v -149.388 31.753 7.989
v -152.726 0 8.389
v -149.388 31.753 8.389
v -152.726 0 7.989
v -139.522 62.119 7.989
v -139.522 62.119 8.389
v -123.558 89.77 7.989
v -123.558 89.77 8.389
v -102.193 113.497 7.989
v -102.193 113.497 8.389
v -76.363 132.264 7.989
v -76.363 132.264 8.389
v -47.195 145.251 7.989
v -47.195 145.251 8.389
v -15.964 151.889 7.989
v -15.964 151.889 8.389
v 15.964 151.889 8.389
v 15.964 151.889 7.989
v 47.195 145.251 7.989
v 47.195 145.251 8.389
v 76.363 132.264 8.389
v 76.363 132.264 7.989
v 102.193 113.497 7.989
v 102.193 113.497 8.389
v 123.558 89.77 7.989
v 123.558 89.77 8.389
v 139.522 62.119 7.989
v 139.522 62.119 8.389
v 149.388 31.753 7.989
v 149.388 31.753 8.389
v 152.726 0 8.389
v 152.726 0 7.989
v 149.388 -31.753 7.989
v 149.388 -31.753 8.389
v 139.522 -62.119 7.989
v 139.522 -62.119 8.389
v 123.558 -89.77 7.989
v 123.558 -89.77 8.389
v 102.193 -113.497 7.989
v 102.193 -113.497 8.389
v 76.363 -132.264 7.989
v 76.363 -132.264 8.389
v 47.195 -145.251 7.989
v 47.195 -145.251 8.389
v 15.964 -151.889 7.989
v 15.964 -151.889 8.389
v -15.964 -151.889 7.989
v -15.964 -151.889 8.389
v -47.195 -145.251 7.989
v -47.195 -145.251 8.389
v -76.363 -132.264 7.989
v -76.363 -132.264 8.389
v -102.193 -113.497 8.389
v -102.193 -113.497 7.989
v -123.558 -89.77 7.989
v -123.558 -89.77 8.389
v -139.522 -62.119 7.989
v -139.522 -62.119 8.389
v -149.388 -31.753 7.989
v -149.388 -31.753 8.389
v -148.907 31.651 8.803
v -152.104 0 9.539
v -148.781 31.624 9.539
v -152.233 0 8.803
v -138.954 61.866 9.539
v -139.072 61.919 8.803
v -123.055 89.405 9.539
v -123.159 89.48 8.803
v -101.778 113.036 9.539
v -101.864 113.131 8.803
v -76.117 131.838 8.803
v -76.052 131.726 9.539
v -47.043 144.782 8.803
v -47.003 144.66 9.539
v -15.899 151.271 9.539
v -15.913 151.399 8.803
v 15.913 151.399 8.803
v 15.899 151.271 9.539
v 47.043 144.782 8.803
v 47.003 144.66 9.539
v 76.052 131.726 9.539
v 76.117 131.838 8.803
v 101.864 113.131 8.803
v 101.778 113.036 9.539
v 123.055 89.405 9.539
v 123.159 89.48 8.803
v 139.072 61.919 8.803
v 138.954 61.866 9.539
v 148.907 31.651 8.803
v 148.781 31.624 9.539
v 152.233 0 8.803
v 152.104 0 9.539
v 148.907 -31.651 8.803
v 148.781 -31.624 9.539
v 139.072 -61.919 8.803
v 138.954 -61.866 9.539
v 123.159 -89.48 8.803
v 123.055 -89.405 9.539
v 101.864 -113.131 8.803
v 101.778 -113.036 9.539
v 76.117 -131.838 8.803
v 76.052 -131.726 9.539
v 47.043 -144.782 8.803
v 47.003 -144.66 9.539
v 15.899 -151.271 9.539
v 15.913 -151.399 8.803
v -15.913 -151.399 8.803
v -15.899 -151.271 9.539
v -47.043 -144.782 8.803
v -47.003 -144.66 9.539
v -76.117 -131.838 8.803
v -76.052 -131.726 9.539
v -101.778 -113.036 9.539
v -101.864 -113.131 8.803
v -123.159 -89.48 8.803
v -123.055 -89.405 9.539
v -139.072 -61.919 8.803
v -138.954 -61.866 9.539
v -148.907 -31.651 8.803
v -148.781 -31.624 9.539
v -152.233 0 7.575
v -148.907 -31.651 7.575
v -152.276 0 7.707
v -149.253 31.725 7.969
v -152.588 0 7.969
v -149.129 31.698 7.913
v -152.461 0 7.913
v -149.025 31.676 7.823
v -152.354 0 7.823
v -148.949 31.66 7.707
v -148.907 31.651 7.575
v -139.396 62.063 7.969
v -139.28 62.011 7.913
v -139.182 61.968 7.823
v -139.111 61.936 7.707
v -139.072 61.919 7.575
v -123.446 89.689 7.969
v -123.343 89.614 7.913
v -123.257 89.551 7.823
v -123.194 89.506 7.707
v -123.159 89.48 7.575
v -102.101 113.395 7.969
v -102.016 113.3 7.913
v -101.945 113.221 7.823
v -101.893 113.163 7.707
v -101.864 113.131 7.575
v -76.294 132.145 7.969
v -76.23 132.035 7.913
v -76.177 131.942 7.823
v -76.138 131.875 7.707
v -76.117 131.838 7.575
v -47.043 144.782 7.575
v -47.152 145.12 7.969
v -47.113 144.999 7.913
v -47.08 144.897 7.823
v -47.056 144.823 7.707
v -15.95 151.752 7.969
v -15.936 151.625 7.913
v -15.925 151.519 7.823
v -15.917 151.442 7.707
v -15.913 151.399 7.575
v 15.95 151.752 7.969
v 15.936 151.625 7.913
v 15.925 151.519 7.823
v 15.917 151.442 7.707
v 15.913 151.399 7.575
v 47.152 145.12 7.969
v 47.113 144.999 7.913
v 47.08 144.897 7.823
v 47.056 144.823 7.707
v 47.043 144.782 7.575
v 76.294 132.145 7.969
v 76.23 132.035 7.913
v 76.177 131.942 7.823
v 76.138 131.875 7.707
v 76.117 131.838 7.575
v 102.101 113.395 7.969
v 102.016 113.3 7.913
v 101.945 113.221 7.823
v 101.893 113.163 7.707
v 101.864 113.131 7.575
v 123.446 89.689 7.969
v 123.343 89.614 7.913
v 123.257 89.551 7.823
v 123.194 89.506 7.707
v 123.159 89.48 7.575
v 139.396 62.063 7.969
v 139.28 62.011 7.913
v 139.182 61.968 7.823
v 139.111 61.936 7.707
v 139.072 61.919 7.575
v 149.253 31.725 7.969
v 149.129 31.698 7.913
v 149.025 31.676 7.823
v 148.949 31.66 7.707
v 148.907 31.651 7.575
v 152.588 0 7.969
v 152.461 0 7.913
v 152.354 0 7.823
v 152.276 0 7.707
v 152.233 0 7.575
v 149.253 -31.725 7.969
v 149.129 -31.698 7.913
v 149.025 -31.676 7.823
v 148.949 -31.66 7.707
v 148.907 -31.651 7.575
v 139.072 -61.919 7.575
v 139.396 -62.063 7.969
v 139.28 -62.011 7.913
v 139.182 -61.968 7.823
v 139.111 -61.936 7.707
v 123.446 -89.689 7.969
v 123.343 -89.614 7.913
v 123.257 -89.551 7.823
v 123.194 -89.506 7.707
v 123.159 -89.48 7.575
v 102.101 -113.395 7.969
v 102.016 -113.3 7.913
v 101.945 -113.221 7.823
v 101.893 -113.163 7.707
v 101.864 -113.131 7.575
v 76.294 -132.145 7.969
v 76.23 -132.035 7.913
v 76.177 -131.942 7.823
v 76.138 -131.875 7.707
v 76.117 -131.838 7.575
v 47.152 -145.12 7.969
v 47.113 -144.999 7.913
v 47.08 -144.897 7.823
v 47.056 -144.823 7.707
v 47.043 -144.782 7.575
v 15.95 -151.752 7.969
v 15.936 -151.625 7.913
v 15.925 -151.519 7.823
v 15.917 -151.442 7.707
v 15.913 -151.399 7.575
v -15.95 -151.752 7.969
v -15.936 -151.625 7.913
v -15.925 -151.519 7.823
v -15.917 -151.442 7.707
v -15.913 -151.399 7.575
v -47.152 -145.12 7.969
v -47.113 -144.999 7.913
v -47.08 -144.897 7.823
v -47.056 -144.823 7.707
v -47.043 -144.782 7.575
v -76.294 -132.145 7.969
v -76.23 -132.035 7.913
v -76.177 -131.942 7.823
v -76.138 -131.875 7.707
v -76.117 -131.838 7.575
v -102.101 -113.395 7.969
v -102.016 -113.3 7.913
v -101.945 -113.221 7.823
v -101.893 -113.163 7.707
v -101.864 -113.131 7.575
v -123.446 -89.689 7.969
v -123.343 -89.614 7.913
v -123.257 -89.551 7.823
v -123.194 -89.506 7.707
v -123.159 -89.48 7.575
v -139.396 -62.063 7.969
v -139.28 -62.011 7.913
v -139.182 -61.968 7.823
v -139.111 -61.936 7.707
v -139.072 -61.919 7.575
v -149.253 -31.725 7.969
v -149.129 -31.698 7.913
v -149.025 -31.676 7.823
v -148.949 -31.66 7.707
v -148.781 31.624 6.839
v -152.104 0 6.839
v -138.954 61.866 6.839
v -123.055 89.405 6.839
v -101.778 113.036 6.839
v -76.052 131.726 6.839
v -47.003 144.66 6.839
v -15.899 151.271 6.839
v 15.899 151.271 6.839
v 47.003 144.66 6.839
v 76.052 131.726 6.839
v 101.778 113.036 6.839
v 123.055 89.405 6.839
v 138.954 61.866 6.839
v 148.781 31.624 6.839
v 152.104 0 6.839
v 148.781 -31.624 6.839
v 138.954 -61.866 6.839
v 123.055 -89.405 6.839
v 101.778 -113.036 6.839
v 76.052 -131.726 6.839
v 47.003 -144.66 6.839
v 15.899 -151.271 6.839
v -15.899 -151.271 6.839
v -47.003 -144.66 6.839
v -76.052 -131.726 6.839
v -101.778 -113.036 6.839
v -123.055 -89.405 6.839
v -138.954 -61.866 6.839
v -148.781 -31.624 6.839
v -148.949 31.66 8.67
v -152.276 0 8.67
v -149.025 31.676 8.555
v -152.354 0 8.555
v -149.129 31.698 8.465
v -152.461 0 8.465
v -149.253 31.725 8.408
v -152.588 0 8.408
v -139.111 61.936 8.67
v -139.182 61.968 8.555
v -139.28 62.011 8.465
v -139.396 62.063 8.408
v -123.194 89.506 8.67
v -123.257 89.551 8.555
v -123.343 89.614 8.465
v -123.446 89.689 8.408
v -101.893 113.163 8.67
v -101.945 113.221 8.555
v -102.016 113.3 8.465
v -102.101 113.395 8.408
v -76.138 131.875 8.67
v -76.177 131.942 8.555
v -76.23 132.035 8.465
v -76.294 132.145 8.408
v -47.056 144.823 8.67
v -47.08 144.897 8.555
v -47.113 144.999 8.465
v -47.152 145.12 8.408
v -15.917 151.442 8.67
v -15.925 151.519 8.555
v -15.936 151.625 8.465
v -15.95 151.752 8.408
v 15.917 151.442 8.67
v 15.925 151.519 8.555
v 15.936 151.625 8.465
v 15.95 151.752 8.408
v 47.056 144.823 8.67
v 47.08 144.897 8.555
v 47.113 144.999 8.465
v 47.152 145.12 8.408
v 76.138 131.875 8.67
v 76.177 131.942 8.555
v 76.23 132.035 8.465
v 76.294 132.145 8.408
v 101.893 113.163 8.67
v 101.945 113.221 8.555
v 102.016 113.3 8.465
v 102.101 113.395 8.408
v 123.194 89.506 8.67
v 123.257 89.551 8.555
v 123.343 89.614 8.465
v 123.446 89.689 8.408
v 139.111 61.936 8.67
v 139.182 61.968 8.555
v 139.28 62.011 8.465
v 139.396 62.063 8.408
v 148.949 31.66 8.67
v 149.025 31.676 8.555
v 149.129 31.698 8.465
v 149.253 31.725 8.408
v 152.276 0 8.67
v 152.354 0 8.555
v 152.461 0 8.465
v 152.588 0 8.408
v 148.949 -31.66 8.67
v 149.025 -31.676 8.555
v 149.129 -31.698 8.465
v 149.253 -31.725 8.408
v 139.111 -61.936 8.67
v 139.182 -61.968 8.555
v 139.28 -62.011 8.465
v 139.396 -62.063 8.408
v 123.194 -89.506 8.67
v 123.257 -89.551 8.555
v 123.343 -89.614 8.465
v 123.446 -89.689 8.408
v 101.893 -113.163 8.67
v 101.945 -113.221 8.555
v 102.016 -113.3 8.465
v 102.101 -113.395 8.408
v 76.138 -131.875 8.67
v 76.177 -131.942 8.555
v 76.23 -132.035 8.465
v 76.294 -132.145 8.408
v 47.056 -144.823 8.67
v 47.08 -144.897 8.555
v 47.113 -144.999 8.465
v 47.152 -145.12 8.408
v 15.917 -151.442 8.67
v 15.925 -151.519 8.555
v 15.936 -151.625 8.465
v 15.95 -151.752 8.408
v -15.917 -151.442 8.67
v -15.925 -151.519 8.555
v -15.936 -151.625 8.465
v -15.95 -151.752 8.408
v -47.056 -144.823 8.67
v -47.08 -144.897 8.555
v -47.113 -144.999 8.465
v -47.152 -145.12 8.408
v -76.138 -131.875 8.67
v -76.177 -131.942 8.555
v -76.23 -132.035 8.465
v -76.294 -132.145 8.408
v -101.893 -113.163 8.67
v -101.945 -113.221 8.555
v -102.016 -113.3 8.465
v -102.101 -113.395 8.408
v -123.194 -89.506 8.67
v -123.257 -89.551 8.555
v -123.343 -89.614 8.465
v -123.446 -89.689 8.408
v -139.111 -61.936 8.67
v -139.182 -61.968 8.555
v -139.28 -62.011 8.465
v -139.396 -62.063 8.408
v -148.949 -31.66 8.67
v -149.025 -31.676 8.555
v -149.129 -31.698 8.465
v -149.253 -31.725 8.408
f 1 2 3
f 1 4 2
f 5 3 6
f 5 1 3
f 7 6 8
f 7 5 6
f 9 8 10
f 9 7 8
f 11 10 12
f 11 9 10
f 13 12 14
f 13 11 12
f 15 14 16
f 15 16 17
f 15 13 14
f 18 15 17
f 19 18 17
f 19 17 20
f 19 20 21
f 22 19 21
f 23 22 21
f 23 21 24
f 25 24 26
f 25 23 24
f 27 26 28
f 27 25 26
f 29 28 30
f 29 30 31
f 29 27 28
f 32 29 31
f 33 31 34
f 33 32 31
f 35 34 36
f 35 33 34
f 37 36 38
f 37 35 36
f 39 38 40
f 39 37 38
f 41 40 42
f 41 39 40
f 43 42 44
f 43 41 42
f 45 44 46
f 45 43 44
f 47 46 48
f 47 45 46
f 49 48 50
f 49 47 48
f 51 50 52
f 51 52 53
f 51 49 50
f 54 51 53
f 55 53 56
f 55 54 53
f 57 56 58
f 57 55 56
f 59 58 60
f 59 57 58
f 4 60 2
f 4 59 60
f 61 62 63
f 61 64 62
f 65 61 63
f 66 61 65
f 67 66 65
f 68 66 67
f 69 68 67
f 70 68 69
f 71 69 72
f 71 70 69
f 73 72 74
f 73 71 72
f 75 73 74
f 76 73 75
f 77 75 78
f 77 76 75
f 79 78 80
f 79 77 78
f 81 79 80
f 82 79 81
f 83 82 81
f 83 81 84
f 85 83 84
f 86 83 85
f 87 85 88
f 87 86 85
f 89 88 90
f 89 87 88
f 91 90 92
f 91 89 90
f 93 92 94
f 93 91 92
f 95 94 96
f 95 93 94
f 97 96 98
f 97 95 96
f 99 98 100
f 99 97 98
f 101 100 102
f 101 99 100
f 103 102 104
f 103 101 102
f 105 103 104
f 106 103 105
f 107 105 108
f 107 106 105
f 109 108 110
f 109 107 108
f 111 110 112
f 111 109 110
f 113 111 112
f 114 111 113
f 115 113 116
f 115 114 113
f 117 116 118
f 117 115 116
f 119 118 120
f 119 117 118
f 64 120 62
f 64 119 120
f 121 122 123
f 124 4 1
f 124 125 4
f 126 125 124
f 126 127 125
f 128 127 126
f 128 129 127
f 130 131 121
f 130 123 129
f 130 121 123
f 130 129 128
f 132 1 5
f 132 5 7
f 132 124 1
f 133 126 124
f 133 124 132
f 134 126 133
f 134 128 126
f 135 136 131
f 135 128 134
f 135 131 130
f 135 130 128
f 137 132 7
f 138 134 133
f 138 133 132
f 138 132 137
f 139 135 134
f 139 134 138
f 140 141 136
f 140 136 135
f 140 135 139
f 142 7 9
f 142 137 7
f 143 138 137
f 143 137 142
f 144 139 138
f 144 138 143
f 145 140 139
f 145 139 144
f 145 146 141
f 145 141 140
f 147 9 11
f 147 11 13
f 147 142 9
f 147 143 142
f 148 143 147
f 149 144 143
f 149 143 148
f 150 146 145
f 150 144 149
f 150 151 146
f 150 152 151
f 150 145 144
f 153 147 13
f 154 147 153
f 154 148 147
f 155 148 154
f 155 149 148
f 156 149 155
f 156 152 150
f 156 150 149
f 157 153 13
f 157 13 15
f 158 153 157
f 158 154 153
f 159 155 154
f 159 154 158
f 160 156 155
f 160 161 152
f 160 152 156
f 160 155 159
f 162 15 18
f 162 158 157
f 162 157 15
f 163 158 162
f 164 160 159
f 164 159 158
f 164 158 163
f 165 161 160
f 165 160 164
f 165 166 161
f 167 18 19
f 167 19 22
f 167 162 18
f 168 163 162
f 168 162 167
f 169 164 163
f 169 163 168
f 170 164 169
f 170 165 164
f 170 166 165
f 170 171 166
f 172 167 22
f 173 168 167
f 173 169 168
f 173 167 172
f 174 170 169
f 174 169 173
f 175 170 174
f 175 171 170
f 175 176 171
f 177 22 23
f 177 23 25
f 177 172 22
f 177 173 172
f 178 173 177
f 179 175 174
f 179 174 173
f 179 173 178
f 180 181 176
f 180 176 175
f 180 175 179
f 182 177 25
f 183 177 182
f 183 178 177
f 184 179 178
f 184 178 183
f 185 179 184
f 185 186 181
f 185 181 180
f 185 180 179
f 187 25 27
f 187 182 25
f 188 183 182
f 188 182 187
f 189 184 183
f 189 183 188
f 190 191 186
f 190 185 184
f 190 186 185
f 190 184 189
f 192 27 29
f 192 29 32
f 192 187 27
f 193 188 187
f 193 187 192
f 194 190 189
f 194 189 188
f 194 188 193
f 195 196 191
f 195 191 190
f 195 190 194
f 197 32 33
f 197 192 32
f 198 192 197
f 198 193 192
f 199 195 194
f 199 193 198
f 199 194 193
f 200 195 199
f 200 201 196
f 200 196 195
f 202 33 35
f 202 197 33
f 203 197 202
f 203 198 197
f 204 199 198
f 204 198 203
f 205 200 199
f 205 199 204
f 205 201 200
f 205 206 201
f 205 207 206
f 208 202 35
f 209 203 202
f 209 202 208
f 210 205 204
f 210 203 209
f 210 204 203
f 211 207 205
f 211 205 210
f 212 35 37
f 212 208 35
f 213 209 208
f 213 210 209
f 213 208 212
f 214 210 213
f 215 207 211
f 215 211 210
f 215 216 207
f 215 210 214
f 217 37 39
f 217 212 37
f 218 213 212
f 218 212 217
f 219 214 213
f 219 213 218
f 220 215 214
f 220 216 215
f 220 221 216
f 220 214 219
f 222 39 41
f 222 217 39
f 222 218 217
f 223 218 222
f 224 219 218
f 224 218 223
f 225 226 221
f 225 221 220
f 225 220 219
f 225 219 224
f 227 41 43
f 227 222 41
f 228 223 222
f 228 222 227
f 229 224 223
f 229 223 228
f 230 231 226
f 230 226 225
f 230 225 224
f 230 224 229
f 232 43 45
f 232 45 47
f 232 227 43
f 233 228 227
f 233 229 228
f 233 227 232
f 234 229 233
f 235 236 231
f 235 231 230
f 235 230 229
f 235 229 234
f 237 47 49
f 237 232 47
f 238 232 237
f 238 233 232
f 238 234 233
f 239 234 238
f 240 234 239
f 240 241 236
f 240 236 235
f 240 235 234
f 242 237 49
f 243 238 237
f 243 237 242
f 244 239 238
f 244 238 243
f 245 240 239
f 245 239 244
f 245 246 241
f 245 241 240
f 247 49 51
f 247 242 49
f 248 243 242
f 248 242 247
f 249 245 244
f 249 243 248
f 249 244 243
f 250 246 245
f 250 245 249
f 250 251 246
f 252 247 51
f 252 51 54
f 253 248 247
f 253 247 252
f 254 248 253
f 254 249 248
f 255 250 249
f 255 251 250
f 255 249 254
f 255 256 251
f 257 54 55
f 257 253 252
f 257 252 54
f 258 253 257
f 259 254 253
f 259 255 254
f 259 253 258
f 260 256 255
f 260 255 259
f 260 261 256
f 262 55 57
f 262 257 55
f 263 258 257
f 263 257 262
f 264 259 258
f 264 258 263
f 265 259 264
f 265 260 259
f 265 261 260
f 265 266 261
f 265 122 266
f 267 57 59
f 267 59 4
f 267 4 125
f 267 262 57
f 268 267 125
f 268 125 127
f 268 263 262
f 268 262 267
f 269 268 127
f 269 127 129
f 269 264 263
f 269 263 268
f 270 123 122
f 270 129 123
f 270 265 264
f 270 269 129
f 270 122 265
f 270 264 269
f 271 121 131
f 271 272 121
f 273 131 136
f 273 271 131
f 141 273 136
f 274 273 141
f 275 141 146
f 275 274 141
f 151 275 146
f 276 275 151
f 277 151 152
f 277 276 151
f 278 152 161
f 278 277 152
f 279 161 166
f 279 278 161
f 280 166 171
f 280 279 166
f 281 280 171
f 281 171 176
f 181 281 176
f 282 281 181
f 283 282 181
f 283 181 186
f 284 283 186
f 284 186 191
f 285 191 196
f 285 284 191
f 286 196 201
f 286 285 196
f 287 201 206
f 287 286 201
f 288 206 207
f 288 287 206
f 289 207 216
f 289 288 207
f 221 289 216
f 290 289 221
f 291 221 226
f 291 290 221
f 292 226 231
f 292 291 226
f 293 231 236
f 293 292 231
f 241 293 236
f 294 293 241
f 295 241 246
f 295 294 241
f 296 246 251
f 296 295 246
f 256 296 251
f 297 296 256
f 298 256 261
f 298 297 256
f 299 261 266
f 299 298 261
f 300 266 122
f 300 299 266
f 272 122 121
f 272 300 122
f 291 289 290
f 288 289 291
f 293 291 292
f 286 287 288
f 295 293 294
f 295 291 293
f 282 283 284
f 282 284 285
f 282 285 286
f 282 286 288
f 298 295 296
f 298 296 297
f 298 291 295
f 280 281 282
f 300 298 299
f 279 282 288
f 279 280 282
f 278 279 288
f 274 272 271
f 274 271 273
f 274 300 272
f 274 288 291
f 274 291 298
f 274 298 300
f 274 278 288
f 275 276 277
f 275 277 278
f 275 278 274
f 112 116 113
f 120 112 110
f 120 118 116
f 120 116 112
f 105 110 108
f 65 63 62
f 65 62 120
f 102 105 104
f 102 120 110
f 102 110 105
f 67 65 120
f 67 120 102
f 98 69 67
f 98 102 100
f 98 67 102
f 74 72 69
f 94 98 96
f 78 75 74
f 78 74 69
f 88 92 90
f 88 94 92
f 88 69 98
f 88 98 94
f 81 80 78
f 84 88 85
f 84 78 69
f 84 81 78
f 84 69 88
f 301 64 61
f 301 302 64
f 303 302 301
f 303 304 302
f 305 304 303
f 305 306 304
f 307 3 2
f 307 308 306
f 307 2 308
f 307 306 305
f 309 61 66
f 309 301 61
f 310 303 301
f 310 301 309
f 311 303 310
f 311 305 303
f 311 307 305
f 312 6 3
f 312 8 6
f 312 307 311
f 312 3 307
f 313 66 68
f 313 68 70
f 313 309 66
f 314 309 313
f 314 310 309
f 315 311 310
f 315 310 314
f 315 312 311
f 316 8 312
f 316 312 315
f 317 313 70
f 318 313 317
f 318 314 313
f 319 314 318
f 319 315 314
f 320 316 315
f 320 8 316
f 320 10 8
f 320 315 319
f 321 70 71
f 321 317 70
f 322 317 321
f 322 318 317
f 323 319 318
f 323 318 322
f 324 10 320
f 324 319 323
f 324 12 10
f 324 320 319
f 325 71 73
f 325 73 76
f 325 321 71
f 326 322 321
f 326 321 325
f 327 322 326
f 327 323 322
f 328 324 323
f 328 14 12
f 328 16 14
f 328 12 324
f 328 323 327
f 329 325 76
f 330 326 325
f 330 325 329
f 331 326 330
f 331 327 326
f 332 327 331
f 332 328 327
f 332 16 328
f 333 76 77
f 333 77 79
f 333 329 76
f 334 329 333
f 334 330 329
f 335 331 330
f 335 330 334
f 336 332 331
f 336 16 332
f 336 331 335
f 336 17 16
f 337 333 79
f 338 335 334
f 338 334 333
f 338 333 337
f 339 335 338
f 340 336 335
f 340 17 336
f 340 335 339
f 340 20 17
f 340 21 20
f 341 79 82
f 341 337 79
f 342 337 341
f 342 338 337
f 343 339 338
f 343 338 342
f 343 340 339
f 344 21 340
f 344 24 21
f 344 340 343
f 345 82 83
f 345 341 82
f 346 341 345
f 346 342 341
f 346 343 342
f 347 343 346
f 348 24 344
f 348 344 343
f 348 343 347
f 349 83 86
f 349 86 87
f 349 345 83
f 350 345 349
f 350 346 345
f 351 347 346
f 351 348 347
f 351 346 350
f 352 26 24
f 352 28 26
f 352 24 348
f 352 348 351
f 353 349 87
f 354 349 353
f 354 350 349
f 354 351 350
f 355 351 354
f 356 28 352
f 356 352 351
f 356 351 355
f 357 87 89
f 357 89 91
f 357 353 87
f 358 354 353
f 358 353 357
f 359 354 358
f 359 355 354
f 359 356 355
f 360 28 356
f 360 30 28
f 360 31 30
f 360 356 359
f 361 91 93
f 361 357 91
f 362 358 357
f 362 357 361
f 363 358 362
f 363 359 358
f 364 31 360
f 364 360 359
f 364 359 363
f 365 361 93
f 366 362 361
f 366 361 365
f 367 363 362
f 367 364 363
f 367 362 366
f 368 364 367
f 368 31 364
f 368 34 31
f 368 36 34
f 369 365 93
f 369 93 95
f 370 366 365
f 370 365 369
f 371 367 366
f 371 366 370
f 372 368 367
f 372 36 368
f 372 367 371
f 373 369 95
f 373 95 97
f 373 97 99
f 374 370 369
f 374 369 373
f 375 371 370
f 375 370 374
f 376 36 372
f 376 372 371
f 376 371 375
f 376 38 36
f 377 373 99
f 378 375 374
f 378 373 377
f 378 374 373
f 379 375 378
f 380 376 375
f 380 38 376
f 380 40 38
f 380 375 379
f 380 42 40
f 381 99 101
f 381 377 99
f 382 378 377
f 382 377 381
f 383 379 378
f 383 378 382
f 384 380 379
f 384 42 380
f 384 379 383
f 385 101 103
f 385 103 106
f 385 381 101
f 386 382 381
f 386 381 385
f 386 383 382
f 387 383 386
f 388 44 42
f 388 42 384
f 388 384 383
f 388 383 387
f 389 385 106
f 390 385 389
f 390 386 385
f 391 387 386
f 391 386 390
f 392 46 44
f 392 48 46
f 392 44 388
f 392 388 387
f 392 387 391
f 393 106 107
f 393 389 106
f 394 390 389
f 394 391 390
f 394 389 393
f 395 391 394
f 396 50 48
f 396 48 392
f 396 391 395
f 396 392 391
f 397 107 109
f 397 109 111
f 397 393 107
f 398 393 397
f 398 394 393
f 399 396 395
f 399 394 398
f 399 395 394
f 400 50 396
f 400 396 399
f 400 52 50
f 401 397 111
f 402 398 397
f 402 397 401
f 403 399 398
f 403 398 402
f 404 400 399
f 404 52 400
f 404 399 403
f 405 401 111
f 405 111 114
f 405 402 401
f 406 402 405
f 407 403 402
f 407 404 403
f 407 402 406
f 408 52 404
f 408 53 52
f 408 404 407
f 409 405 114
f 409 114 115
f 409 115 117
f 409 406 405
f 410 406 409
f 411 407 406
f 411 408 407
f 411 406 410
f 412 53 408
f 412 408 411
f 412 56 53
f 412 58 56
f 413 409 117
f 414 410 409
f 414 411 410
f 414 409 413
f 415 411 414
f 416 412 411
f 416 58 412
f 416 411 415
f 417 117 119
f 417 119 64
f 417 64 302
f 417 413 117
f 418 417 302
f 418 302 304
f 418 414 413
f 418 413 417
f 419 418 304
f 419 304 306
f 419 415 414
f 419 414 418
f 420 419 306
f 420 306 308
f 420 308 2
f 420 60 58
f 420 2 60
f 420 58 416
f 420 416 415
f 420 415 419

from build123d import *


with BuildPart() as f1:
    # F0 (on Front) → F1 (revolve)
    with BuildSketch(Plane.XZ):
        with BuildLine():
            Line((0, 6.838791), (0, 9.538791))
            Line((0, 9.538791), (-20.181025, 9.538791))
            Line((-20.181025, 9.538791), (-20.309017, 9.538791))
            Line((-20.309017, 9.538791), (-152.104487, 9.538791))
            Line((-152.104487, 9.538791), (-152.233252, 8.802641))
            ThreePointArc((-152.233252, 8.802641), (-152.404118, 8.505989), (-152.725774, 8.388791))
            Line((-152.725774, 8.388791), (-152.725774, 7.988791))
            ThreePointArc((-152.725774, 7.988791), (-152.404118, 7.871594), (-152.233252, 7.574942))
            Line((-152.233252, 7.574942), (-152.104487, 6.838791))
            Line((-152.104487, 6.838791), (-20.309017, 6.838791))
            Line((-20.309017, 6.838791), (-20.181025, 6.838791))
            Line((-20.181025, 6.838791), (0, 6.838791))
        make_face()
    revolve(axis=Axis((0, 0, -43.787105), (0, 0, -1)))


solid = f1.part
